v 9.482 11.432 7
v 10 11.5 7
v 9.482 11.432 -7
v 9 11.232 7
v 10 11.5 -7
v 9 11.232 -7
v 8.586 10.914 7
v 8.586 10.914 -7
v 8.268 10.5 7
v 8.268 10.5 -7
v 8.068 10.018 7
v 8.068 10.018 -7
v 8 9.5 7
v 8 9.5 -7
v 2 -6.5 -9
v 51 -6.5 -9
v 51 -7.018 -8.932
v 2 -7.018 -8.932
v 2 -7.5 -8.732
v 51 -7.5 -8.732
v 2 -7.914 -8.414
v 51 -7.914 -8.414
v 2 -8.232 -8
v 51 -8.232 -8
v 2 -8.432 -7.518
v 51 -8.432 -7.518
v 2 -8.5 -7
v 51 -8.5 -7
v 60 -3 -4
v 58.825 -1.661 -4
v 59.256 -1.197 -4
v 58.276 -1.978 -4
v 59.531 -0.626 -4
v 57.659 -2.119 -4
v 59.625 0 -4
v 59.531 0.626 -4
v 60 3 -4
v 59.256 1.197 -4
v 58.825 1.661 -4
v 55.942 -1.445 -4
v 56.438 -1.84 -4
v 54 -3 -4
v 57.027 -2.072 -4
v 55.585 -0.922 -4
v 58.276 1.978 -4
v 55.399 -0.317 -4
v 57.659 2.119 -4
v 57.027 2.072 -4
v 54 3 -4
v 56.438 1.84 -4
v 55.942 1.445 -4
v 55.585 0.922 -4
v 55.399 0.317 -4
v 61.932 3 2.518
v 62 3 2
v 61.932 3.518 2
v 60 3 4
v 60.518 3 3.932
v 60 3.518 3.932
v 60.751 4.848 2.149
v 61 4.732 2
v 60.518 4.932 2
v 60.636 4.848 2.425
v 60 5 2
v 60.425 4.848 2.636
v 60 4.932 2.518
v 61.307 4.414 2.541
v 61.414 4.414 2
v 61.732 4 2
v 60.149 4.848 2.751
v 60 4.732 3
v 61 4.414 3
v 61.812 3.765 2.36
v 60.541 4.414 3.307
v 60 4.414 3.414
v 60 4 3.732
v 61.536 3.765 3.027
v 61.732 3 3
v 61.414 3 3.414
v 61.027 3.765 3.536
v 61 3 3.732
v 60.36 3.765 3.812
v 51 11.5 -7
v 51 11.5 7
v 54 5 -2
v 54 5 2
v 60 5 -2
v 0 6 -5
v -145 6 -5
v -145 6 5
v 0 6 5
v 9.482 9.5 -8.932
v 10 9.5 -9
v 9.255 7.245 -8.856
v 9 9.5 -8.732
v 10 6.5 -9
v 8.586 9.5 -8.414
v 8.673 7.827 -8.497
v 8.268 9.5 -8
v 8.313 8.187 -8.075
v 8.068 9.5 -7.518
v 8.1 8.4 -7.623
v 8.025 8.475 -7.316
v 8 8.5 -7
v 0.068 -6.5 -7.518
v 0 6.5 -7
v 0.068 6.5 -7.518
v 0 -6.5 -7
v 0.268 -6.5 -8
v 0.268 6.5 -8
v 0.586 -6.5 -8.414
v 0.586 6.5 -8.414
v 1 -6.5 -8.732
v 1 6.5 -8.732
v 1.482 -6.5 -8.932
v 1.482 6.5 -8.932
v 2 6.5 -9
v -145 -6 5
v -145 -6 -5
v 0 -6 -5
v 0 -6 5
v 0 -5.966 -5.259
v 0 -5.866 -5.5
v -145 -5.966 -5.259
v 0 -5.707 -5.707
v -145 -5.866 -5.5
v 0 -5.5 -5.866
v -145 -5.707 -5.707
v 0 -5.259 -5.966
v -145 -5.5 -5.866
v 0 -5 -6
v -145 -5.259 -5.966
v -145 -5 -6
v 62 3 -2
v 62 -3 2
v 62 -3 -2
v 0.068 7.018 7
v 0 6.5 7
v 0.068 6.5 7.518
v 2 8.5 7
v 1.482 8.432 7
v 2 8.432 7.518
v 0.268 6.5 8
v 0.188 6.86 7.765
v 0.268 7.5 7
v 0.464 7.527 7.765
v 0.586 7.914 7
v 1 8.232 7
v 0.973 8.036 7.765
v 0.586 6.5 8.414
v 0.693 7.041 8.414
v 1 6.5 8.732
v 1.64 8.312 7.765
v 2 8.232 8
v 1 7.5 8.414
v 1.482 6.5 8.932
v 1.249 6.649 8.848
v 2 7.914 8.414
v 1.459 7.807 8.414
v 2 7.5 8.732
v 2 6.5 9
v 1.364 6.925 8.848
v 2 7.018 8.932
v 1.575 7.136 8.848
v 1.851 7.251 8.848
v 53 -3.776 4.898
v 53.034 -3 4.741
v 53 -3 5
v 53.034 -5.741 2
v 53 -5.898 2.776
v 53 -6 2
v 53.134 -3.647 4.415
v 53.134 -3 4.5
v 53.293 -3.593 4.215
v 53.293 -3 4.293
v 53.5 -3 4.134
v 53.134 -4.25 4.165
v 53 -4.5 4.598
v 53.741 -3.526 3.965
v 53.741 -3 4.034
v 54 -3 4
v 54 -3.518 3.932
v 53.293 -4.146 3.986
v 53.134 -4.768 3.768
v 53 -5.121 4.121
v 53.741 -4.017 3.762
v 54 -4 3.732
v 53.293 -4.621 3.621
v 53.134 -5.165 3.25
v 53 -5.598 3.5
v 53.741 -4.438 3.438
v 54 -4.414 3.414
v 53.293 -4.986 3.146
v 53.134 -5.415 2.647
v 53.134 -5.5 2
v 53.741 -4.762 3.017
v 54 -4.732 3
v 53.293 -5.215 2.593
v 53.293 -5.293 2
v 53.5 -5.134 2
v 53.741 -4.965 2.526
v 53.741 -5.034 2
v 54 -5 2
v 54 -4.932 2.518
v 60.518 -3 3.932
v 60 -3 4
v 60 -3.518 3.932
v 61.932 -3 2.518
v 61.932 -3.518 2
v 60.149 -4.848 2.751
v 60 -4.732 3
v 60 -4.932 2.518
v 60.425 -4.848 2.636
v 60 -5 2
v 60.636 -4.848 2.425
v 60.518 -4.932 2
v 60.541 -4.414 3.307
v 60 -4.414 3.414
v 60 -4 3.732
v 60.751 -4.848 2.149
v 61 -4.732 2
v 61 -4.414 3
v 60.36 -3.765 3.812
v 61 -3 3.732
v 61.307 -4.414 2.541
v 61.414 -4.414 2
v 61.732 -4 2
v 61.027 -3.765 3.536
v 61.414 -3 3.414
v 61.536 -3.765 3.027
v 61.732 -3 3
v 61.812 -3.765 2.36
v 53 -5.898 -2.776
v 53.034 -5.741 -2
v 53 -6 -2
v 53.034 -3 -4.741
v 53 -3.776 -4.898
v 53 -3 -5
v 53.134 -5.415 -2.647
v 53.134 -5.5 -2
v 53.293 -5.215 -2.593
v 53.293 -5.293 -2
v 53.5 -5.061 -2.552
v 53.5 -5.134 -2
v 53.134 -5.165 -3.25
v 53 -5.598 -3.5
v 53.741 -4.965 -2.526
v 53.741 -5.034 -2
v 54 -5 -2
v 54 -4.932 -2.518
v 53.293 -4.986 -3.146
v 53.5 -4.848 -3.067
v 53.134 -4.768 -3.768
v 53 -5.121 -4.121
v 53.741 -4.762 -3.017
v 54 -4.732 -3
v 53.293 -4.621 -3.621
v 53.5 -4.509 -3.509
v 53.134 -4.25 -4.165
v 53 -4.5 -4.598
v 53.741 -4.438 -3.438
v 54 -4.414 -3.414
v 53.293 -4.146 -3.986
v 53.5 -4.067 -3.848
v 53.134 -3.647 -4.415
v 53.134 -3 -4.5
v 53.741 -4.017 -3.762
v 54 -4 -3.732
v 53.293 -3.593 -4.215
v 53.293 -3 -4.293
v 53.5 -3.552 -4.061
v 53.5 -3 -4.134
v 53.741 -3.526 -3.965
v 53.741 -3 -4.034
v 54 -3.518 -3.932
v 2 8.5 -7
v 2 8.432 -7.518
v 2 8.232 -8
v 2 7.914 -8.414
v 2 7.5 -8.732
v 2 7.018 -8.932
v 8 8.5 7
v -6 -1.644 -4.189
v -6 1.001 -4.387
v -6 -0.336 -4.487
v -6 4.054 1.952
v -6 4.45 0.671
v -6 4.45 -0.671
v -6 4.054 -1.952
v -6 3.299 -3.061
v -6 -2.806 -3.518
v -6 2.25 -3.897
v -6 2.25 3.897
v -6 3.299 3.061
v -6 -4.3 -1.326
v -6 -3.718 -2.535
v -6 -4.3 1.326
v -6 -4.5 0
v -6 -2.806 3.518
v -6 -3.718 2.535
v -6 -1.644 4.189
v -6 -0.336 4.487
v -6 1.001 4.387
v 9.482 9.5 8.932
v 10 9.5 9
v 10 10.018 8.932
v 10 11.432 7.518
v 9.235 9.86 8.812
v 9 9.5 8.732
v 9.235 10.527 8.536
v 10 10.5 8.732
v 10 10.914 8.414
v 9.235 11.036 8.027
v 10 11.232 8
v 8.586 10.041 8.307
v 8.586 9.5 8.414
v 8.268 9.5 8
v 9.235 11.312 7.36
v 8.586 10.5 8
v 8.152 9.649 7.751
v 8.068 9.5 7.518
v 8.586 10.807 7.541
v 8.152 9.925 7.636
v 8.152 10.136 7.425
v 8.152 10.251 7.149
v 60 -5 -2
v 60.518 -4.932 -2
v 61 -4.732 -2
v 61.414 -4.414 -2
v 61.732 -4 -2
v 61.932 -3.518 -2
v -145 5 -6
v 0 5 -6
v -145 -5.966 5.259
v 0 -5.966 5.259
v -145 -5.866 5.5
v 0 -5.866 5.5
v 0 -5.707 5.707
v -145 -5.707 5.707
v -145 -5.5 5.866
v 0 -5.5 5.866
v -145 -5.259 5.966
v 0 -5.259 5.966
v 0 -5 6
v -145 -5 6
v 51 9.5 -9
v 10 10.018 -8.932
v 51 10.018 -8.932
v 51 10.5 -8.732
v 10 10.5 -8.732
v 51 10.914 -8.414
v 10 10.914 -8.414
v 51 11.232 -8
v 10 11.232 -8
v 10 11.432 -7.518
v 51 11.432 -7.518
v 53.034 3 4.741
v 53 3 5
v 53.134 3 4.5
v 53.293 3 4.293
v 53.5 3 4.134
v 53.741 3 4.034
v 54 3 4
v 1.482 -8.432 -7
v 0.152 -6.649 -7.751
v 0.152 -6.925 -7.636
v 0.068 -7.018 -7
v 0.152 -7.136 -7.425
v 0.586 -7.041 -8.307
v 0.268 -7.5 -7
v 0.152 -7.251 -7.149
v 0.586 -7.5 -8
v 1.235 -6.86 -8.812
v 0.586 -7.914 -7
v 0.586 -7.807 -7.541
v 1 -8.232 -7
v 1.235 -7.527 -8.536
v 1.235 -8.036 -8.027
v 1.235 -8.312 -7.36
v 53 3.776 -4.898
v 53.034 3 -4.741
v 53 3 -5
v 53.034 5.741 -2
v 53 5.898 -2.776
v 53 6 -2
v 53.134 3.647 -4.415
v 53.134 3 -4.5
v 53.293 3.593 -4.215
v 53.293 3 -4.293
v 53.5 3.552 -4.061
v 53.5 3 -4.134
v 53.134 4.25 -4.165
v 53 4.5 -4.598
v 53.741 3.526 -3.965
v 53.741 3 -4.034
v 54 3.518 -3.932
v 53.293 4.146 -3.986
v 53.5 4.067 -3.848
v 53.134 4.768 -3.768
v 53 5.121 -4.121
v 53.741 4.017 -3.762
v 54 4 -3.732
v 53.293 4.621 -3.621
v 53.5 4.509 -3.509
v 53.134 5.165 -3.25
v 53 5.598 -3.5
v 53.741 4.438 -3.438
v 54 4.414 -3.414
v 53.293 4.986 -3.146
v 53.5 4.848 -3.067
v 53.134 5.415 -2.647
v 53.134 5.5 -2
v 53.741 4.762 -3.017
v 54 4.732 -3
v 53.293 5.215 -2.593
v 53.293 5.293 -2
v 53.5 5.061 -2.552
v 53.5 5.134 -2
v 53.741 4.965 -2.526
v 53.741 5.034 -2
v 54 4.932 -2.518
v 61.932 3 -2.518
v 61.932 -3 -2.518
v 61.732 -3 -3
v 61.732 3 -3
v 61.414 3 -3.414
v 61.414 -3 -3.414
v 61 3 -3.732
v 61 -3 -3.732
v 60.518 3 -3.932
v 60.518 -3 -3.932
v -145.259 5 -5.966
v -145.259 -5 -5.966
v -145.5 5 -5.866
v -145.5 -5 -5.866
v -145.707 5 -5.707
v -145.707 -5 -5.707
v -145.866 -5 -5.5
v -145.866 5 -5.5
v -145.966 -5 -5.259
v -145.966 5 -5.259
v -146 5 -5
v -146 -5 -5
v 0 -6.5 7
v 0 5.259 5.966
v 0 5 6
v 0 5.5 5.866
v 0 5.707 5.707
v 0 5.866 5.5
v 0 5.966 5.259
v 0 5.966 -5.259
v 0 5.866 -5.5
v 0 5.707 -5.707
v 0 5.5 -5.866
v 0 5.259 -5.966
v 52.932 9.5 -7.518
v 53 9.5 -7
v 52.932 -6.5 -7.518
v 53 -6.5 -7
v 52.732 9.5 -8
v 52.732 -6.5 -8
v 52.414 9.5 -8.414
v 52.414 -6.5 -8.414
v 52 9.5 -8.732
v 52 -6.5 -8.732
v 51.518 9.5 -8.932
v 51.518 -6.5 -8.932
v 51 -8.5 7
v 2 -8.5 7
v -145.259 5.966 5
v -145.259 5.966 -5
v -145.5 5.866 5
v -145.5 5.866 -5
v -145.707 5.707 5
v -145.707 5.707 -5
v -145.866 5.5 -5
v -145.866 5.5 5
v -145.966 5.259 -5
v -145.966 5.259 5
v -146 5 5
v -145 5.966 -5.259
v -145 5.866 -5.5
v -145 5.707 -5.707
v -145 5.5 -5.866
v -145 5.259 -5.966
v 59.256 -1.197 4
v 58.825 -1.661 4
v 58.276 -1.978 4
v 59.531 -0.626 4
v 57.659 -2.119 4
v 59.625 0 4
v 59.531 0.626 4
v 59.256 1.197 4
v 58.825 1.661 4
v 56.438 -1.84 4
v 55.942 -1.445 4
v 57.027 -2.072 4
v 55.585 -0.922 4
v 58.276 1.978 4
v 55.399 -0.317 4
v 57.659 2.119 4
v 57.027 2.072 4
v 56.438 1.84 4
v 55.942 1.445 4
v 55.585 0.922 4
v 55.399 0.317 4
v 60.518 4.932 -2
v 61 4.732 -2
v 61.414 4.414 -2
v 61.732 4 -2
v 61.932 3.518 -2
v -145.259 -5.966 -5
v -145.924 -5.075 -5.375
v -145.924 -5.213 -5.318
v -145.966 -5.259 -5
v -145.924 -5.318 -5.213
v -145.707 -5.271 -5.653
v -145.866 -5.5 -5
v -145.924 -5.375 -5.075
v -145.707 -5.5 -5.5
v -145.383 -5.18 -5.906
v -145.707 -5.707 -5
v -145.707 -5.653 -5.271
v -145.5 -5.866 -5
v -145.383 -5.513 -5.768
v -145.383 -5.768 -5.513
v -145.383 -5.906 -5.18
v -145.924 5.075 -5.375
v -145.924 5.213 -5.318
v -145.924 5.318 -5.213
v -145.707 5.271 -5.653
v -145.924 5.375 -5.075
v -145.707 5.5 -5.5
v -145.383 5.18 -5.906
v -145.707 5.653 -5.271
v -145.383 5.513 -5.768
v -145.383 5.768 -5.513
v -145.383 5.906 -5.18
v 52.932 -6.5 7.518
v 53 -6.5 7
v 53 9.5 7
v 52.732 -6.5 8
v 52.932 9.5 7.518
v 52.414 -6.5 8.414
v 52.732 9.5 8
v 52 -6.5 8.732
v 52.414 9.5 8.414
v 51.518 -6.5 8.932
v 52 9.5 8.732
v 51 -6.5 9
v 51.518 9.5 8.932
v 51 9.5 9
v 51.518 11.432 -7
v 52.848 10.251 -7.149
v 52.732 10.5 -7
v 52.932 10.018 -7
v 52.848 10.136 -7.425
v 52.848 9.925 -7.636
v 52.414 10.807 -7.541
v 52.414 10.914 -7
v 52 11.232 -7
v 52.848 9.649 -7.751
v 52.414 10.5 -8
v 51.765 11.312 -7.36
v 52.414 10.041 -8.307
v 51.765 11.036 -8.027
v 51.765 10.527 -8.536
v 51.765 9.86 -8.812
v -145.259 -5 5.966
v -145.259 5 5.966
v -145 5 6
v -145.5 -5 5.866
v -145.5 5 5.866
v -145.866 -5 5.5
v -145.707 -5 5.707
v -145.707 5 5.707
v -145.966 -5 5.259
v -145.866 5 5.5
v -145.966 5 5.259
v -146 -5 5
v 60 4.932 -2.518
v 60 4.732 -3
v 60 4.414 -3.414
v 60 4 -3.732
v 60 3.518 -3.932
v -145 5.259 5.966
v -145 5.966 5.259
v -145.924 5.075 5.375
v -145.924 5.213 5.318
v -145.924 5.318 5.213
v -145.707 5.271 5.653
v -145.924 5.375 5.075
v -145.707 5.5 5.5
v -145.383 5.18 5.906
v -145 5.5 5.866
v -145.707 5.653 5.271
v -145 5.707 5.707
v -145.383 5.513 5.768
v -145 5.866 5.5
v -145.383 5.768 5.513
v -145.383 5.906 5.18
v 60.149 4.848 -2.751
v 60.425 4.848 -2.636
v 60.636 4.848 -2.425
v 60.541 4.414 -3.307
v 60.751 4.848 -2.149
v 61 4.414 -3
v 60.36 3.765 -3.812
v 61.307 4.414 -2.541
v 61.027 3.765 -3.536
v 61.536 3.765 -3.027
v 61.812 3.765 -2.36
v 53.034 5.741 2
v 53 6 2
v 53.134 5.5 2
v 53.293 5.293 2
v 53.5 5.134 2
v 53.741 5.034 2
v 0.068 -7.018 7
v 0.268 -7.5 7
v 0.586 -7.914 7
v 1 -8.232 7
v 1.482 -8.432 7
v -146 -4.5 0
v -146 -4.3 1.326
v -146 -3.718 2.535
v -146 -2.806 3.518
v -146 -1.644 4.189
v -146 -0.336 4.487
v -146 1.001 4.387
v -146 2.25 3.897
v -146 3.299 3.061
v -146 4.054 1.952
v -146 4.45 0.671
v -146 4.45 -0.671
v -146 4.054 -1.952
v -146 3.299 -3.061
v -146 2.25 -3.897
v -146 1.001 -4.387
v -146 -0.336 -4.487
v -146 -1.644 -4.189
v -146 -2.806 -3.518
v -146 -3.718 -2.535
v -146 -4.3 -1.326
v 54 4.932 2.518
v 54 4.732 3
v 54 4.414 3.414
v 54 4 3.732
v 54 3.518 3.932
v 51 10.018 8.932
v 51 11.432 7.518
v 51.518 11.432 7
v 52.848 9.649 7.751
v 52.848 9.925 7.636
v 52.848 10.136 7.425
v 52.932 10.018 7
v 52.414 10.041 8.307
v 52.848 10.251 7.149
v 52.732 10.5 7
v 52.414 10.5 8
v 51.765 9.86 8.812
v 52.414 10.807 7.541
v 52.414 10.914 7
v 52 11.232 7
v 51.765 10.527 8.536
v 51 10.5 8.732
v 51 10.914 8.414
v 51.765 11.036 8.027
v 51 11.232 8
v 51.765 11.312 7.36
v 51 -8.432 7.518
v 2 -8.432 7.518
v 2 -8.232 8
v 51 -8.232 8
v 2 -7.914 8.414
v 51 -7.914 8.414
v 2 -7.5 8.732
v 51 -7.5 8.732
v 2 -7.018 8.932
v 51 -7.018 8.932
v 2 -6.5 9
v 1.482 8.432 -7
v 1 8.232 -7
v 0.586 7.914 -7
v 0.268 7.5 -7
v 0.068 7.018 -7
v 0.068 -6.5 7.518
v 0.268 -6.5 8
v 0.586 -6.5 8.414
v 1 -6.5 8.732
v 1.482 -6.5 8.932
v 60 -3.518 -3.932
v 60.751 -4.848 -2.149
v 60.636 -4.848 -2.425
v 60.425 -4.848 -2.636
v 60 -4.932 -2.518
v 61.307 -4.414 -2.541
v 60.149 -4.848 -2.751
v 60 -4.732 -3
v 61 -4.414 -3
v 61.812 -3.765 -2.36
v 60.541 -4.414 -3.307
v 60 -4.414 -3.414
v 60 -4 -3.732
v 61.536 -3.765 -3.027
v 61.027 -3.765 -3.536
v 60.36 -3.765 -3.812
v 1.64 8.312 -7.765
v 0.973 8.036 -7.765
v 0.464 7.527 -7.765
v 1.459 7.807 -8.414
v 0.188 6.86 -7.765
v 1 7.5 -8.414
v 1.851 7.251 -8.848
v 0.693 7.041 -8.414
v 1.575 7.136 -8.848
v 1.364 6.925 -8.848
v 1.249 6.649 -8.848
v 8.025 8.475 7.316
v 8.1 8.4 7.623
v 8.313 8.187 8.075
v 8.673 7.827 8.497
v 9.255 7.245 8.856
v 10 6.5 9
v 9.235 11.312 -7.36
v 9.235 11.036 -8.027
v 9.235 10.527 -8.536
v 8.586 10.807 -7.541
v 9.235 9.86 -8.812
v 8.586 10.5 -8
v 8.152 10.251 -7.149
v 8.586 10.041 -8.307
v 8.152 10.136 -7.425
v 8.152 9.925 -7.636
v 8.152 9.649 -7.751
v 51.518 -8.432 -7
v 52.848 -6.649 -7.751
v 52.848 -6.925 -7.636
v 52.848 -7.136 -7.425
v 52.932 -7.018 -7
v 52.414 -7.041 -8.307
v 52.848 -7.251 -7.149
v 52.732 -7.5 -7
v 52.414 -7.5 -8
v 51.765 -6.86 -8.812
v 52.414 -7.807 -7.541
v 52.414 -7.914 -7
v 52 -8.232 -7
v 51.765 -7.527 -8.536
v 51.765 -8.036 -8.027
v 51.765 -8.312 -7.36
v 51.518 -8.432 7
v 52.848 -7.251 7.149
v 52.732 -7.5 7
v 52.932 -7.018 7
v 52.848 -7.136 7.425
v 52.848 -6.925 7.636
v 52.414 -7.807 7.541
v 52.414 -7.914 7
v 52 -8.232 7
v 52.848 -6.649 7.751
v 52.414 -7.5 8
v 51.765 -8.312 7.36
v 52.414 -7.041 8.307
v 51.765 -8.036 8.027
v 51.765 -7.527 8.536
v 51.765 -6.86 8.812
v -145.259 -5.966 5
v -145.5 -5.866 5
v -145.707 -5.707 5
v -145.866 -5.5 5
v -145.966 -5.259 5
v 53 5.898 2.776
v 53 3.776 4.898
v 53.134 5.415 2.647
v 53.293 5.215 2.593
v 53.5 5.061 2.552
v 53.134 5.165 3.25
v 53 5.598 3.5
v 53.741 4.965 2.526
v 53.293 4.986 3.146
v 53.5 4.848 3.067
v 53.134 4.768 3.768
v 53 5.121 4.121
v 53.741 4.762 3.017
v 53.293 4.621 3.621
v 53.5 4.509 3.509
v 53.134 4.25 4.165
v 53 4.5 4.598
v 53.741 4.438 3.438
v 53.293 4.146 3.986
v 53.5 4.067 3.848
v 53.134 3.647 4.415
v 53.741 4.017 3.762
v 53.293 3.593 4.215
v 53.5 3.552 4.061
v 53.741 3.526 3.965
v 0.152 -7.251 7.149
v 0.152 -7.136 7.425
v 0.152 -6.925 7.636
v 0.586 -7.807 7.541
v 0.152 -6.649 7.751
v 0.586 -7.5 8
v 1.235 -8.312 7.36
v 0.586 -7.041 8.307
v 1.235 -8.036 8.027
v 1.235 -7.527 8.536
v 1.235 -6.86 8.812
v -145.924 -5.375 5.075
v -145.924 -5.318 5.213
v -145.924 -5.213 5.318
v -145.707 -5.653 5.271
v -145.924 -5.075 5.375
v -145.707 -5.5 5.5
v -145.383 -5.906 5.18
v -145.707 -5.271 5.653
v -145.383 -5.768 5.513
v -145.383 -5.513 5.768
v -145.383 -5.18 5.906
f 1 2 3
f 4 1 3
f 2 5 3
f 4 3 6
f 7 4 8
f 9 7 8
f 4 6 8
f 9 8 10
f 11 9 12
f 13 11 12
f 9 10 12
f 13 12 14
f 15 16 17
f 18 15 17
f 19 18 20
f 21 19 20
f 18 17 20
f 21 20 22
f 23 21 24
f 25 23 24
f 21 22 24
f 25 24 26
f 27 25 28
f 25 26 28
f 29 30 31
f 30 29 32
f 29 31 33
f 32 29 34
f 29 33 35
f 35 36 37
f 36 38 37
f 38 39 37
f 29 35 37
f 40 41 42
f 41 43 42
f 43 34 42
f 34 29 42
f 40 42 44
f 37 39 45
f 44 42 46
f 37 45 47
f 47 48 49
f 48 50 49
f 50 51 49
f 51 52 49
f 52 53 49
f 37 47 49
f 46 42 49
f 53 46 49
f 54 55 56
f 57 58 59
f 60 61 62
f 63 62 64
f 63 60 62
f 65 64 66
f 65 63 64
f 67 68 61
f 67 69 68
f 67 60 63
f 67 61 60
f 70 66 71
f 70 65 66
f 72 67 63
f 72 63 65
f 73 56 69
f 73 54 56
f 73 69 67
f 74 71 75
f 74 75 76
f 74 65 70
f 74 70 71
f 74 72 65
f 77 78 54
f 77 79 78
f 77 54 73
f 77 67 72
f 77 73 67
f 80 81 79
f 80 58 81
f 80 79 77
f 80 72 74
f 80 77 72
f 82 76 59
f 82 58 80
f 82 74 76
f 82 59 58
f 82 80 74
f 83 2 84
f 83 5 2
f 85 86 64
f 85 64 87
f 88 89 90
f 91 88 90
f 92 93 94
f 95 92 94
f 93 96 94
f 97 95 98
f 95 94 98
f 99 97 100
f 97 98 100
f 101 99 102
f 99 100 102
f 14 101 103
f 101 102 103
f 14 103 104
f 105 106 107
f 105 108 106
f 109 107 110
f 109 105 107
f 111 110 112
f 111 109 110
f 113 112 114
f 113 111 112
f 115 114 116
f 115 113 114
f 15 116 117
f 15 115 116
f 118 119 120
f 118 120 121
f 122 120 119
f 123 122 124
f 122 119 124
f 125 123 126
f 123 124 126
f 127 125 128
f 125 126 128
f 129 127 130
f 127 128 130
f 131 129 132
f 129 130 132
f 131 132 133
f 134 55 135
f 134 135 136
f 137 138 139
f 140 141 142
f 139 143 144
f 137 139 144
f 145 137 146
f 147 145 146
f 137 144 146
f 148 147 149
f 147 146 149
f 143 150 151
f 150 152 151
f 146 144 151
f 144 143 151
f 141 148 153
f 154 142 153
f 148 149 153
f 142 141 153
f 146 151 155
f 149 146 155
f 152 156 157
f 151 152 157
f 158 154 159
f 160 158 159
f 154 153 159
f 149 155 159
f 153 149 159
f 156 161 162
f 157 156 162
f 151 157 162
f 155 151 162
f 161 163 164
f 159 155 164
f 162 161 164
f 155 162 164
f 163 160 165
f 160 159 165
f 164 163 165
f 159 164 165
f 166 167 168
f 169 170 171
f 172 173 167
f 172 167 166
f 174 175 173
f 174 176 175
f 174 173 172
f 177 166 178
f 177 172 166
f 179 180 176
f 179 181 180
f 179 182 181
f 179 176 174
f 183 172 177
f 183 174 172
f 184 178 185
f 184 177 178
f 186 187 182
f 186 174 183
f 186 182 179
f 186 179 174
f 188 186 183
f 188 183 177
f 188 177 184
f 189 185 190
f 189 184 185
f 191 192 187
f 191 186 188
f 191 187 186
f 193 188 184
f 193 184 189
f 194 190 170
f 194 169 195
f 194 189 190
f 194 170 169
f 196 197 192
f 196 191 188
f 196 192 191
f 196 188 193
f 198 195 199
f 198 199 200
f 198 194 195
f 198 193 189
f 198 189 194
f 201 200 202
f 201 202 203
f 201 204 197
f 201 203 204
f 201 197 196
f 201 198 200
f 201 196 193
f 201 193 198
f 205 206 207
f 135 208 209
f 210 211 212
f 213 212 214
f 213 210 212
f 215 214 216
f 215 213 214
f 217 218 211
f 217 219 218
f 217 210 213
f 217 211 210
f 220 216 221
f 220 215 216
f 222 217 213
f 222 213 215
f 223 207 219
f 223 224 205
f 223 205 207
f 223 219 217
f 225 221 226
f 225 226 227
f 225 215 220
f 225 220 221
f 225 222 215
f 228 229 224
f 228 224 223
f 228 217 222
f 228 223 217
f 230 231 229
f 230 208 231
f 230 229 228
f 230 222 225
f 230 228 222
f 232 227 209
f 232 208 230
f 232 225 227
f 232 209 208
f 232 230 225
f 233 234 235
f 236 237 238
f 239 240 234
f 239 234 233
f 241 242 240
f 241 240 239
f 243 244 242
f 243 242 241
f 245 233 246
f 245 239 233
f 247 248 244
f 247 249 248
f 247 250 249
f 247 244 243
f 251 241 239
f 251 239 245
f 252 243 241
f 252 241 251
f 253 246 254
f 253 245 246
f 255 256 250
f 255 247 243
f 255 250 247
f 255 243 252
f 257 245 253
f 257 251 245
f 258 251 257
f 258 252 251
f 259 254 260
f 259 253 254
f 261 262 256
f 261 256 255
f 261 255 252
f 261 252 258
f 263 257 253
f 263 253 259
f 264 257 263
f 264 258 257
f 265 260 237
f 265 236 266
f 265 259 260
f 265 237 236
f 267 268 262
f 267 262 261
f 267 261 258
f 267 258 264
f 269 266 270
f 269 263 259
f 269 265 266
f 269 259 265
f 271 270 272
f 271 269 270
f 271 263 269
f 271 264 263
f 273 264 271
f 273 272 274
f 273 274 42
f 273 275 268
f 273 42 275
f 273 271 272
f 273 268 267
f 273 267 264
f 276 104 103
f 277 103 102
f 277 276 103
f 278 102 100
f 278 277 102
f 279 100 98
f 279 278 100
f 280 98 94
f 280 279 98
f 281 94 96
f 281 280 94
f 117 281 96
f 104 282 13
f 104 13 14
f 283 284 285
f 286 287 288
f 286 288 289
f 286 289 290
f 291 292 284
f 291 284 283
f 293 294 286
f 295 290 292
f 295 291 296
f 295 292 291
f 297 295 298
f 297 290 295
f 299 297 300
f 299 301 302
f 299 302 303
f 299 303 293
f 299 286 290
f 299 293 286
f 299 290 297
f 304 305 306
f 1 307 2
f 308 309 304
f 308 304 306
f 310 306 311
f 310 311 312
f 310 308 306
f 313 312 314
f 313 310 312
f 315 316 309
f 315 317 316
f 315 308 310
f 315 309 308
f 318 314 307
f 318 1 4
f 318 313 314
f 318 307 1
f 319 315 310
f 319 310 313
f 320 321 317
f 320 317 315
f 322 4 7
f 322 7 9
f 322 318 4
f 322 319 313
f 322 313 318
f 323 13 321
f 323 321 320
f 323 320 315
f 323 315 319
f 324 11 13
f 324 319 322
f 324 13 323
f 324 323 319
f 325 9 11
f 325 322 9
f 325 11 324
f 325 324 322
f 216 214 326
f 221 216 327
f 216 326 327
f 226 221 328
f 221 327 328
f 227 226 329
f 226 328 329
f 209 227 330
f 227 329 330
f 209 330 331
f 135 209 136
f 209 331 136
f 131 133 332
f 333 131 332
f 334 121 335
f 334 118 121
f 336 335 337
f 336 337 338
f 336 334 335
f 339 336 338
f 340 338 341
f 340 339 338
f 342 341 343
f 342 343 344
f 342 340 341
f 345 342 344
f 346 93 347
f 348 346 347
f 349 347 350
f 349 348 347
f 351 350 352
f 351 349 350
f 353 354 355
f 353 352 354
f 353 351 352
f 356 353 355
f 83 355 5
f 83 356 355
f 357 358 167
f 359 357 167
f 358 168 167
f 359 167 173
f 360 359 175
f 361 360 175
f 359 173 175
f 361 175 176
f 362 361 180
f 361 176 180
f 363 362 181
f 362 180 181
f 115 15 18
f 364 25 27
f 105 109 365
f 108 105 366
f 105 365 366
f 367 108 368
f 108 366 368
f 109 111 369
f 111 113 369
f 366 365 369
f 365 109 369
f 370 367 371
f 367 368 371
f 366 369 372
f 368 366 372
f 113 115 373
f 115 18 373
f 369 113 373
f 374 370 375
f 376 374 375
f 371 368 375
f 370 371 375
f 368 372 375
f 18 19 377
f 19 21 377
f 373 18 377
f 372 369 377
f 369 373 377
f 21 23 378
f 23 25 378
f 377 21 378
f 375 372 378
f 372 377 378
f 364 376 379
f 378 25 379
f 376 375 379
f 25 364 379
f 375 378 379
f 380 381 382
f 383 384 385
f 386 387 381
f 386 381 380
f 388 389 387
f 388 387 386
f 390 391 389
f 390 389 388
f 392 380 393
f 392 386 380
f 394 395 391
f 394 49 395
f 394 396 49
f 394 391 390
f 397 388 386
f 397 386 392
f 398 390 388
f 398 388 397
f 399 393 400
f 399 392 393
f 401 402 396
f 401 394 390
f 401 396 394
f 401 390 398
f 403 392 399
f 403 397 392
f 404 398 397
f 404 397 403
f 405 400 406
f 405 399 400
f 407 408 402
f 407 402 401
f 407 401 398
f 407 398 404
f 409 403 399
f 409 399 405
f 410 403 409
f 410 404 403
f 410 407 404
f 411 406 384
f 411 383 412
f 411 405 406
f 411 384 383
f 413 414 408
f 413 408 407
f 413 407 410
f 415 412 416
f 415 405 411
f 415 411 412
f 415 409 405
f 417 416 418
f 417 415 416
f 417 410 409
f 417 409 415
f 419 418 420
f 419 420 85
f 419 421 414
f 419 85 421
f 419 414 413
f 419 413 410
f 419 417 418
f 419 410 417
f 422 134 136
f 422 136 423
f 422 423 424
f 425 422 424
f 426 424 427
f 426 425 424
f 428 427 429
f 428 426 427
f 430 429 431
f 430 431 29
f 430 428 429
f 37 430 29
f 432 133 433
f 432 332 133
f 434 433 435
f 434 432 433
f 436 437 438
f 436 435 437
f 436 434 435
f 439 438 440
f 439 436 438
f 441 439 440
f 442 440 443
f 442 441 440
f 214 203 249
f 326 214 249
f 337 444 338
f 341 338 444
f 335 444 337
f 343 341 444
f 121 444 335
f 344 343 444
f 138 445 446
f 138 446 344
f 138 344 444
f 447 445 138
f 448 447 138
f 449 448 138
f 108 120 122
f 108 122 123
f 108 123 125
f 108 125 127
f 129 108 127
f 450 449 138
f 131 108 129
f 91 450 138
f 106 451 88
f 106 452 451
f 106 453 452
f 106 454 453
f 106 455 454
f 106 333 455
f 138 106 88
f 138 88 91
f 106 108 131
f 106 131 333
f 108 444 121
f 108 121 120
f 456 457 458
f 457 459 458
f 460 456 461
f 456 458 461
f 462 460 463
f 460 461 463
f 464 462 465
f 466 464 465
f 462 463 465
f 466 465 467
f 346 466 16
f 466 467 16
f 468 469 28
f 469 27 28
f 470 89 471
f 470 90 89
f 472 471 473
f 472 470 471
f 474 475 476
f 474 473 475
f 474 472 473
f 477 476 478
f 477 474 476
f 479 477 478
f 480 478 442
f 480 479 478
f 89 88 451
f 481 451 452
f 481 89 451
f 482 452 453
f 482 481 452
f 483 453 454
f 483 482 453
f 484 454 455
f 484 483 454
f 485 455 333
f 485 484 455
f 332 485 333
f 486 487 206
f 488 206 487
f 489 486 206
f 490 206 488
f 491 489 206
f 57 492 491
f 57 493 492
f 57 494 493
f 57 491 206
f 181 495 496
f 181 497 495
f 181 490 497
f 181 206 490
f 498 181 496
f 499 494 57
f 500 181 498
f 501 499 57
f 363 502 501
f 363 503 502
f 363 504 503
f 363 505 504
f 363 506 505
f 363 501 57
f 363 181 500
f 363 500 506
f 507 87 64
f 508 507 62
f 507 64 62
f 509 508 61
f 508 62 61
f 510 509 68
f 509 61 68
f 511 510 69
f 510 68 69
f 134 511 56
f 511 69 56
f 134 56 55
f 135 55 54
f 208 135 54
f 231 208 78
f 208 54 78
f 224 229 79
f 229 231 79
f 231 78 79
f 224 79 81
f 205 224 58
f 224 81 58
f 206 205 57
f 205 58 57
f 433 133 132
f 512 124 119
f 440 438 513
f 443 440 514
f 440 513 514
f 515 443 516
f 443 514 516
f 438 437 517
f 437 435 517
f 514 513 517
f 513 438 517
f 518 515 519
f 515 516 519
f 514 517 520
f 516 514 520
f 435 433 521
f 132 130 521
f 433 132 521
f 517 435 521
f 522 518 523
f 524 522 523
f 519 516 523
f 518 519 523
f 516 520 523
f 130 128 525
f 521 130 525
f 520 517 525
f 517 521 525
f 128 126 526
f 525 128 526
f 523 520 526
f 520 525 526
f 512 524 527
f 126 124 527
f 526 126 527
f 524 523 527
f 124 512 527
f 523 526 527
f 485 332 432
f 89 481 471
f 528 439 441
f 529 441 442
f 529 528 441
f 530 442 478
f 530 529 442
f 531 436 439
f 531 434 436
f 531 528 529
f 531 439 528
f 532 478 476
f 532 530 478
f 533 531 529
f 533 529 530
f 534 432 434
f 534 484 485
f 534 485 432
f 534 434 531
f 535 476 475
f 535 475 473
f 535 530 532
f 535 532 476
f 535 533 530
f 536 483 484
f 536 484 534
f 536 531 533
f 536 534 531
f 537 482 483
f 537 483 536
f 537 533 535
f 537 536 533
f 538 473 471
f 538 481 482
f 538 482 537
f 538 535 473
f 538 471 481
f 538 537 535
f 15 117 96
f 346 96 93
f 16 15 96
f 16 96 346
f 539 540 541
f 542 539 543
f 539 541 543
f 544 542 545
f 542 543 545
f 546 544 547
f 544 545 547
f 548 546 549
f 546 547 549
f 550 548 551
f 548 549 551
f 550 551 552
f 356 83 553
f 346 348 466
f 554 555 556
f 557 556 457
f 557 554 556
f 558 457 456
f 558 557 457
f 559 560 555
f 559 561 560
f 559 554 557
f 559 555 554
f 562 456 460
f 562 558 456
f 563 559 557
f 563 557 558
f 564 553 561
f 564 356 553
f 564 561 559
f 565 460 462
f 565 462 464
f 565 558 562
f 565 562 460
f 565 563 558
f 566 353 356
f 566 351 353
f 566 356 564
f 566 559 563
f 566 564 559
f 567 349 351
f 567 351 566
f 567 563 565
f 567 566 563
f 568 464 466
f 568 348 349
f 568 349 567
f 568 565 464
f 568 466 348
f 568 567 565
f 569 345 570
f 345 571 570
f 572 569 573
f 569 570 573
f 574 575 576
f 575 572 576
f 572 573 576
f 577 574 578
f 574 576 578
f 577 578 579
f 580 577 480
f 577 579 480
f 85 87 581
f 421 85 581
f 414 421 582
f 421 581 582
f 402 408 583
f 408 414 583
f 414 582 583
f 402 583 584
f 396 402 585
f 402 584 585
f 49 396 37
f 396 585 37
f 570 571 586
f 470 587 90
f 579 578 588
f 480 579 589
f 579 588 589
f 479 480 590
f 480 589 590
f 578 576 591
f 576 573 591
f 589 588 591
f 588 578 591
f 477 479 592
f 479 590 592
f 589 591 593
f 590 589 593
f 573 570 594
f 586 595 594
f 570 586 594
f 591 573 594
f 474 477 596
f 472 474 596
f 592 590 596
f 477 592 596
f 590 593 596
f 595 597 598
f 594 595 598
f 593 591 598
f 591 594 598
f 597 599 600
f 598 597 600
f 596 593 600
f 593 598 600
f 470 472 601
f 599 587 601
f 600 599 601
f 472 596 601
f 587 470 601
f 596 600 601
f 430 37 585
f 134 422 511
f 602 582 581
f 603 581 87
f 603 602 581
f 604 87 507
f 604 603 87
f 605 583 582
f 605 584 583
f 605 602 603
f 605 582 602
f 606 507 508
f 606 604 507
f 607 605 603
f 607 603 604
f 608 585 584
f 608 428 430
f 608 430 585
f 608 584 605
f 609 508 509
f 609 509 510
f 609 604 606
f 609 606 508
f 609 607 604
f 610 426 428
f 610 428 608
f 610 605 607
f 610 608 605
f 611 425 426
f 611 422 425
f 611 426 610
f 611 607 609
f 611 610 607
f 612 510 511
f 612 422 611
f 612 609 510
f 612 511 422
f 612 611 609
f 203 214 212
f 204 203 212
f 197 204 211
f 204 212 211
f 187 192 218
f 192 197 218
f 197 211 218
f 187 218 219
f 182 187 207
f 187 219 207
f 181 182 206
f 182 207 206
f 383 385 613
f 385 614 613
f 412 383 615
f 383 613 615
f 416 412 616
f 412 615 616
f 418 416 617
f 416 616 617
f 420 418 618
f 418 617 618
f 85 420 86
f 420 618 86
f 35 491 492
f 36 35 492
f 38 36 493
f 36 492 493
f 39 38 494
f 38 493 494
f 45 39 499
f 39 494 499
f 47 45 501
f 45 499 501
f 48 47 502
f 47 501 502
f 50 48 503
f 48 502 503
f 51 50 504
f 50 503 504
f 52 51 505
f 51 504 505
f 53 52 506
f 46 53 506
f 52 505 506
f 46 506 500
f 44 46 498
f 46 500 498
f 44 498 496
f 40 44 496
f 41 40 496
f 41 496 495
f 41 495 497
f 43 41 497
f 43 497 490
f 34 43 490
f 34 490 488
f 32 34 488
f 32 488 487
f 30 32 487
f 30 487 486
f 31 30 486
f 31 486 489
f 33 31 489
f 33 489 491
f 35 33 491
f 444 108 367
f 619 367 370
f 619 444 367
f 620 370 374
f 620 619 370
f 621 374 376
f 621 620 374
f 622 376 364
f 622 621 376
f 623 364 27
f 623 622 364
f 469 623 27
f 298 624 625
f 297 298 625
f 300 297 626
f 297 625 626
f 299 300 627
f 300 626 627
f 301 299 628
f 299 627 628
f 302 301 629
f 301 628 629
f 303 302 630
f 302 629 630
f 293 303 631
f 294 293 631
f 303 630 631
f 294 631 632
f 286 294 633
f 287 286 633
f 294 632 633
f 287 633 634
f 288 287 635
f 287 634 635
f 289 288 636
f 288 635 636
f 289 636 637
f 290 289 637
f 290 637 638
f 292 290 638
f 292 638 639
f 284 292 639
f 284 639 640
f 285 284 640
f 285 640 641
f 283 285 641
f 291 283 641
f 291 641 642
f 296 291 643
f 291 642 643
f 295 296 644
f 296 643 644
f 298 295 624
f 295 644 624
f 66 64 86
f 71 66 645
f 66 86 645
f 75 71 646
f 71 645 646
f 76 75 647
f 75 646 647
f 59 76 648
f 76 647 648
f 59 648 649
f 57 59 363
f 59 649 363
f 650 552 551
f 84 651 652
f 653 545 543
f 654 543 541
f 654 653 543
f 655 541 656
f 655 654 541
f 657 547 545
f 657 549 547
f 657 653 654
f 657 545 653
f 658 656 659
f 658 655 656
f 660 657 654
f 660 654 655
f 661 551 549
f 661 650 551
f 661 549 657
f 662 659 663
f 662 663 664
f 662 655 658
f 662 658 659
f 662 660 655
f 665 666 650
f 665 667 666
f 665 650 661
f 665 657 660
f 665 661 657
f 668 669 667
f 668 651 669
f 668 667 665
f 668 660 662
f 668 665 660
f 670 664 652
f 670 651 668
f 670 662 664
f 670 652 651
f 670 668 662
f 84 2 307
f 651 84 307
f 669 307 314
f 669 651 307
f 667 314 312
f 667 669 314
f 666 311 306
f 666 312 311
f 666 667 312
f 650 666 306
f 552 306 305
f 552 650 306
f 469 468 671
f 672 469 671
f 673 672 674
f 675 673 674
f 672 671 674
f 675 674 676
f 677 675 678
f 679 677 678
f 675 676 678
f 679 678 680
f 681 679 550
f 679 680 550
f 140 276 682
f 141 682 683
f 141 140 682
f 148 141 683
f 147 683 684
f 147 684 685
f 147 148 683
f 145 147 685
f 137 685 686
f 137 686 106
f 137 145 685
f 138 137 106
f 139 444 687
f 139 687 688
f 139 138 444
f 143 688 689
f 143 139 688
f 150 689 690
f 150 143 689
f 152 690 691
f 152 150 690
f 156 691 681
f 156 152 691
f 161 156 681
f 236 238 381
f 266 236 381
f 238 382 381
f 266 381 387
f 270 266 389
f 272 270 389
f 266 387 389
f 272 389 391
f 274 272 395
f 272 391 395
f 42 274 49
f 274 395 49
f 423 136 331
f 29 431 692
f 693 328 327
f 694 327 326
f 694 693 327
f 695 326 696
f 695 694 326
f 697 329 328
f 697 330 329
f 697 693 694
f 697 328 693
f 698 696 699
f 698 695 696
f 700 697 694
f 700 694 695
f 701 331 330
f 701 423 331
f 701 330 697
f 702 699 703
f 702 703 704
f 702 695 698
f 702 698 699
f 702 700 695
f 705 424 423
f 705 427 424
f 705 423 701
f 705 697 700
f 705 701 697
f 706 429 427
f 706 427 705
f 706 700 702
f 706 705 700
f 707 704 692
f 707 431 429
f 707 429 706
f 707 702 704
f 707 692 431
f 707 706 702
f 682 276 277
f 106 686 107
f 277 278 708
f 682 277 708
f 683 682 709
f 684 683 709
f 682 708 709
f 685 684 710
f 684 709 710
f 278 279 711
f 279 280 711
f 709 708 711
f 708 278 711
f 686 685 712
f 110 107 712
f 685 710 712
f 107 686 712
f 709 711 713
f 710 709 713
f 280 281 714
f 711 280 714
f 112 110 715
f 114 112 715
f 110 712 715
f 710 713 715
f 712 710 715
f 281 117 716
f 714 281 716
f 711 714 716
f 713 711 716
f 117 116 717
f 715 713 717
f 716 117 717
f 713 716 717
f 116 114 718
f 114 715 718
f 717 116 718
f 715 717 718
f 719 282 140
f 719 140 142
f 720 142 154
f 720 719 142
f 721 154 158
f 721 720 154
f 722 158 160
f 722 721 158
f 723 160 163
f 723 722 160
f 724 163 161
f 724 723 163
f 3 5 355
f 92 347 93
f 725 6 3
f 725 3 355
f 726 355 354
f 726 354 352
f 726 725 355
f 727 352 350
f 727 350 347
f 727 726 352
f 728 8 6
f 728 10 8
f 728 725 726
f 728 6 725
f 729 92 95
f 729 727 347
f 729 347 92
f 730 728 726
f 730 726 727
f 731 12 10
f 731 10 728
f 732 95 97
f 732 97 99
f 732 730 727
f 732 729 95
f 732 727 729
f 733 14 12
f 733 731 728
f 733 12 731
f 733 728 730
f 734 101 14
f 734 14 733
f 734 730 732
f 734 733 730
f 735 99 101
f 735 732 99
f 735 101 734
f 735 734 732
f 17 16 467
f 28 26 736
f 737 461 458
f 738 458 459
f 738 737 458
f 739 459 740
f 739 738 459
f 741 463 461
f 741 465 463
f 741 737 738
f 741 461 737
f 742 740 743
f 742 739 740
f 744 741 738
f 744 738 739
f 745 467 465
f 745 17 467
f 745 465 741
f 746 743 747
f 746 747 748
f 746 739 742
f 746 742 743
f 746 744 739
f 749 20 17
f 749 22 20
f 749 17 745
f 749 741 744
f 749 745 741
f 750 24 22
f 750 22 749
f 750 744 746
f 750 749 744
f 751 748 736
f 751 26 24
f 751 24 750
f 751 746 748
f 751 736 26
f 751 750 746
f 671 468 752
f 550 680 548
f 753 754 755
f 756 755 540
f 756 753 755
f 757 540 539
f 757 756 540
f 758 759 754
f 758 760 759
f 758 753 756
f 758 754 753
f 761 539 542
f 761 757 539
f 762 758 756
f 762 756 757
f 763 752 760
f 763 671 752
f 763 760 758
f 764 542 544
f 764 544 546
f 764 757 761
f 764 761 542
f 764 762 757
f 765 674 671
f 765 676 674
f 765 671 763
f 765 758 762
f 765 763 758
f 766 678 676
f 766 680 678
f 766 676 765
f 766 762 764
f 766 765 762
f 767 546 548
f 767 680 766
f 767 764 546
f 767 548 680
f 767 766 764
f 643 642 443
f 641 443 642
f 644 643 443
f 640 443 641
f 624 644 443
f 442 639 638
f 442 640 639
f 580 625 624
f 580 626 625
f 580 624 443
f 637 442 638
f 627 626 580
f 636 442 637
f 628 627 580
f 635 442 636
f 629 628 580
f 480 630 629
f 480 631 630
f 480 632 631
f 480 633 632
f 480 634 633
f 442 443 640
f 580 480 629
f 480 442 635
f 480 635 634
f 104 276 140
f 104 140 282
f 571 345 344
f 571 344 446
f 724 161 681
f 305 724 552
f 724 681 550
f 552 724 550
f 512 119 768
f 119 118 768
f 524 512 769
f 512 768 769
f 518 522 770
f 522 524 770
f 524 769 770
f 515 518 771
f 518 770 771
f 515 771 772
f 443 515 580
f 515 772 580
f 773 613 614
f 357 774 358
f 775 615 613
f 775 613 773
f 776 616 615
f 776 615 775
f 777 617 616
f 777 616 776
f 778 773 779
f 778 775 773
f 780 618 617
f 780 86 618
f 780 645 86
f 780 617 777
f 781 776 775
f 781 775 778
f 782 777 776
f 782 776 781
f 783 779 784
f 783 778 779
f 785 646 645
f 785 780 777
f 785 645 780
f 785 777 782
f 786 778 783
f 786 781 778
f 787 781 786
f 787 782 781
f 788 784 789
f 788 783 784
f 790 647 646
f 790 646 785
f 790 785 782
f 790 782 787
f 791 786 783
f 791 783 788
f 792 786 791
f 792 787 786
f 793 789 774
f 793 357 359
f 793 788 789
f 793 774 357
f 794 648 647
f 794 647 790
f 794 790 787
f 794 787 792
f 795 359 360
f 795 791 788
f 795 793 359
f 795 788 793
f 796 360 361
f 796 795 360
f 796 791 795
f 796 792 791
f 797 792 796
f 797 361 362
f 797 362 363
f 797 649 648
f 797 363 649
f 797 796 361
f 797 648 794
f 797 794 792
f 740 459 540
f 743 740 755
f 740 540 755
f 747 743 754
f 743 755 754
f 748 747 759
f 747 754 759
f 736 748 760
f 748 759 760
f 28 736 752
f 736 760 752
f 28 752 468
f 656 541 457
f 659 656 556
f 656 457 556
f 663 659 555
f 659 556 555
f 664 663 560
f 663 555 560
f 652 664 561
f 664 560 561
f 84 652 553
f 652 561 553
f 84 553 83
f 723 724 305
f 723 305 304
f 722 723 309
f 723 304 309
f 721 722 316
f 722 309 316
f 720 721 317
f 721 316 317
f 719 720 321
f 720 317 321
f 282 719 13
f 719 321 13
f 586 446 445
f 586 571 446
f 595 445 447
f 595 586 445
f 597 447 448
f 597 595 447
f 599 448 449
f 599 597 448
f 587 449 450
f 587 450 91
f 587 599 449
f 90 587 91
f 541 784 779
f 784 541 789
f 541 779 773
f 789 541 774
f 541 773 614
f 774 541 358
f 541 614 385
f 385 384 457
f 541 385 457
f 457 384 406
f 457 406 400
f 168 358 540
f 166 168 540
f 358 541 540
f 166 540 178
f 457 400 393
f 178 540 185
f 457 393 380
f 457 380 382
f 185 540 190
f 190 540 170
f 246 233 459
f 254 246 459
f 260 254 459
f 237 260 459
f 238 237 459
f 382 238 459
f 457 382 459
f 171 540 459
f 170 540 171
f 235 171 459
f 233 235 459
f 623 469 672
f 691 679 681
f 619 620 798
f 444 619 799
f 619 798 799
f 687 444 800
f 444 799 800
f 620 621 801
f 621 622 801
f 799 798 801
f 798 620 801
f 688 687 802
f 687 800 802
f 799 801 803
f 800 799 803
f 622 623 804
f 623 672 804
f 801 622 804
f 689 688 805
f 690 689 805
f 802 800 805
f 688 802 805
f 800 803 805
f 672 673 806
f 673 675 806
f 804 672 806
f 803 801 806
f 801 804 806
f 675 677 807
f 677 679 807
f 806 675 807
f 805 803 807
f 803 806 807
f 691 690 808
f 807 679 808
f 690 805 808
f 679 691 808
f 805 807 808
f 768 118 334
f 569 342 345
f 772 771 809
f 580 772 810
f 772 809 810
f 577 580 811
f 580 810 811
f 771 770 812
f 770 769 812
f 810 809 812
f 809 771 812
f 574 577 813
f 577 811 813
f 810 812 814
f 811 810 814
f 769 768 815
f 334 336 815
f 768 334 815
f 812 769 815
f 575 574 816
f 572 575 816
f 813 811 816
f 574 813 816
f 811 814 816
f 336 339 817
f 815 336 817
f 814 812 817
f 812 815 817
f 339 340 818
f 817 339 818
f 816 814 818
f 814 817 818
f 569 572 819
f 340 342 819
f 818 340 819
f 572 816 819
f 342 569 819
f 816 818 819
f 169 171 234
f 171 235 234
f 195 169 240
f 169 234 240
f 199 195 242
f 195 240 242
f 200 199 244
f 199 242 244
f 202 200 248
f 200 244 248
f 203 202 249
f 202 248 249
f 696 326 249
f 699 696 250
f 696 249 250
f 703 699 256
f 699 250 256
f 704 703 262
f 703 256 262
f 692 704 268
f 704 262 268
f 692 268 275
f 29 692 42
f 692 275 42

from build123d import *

# Parameters (mm, degrees)
BOSS_EXTRUDE1_DEPTH      = 9
BOSS_EXTRUDE1_DEPTH_BACK = 9
SKETCH1_W                = 53
SKETCH1_H                = 17
SKETCH2_W                = 45
SKETCH2_H                = 18
BOSS_EXTRUDE2_DEPTH      = 3
SKETCH3_W                = 8
SKETCH3_H                = 10
BOSS_EXTRUDE3_DEPTH      = 9
SKETCH4_W                = 12
SKETCH4_H                = 12
BOSS_EXTRUDE4_DEPTH      = 146
CUT_EXTRUDE1_REACH       = 149.028
SKETCH6_R                = 2.125
FILLET2_R                = 2
FILLET3_R                = 1
SKETCH7_R                = 4.5
CUT_EXTRUDE2_DEPTH       = 140
FILLET4_R                = 1


with BuildPart() as part:
    # Sketch1 → Boss-Extrude1 (new, two sides: drawn at the far end of the back side and taken through both)
    with BuildSketch(Plane.XY.offset(-BOSS_EXTRUDE1_DEPTH_BACK)):
        with Locations((26.5, 0)):
            Rectangle(SKETCH1_W, SKETCH1_H)
    extrude(amount=BOSS_EXTRUDE1_DEPTH + BOSS_EXTRUDE1_DEPTH_BACK)

    # Sketch2 → Boss-Extrude2 (add)
    with BuildSketch(Plane(origin=(0, 8.5, 0), x_dir=(1, 0, 0), z_dir=(0, 1, 0))):
        with Locations((30.5, 0)):
            Rectangle(SKETCH2_W, SKETCH2_H)
    extrude(amount=BOSS_EXTRUDE2_DEPTH)

    # Sketch3 → Boss-Extrude3 (add)
    with BuildSketch(Plane(origin=(53, 0, 0), x_dir=(0, 0, -1), z_dir=(1, 0, 0))):
        Rectangle(SKETCH3_W, SKETCH3_H)
    extrude(amount=BOSS_EXTRUDE3_DEPTH)

    # Sketch4 → Boss-Extrude4 (add)
    with BuildSketch(Plane.ZY):
        Rectangle(SKETCH4_W, SKETCH4_H)
    extrude(amount=BOSS_EXTRUDE4_DEPTH)

    # Sketch6 → Cut-Extrude1 (cut, up to next)
    with BuildSketch(Plane.XY.offset(4), mode=Mode.PRIVATE) as cut_extrude1_sk1:
        with Locations((57.5, 0)):
            Circle(SKETCH6_R)
    cut_extrude1_tool1 = extrude(cut_extrude1_sk1.sketch, amount=-CUT_EXTRUDE1_REACH, mode=Mode.PRIVATE) & part.part
    add(cut_extrude1_tool1.solids().sort_by_distance((57.5, 0, 4))[0], mode=Mode.SUBTRACT)

    # Fillet2
    fillet2_edges = [part.edges().sort_by_distance(p)[0] for p in [
        (4, 8.5, 9),
        (8, 10, 9),
        (53, 1.5, 9),
        (0, 0, 9),
        (30.5, 11.5, 9),
        (8, 11.5, 0),
        (30.5, 11.5, -9),
        (53, 11.5, 0),
        (26.5, -8.5, -9),
        (0, -8.5, 0),
        (26.5, -8.5, 9),
        (53, -8.5, 0),
        (57.5, -5, -4),
        (62, 0, -4),
        (62, -5, 0),
        (57.5, -5, 4),
        (62, 0, 4),
        (0, 8.5, 0),
        (0, 0, -9),
        (4, 8.5, -9),
        (57.5, 5, 4),
        (62, 5, 0),
        (57.5, 5, -4),
        (53, 1.5, -9),
        (8, 10, -9),
    ]]
    fillet(fillet2_edges, radius=FILLET2_R)

    # Fillet3
    fillet3_edges = [part.edges().sort_by_distance(p)[0] for p in [
        (53, -4.414213562, 3.414213562),
        (53, 0, 4),
        (53, 4.414213562, 3.414213562),
        (53, 5, 0),
        (53, 4.414213562, -3.414213562),
        (53, 0, -4),
        (53, -4.414213562, -3.414213562),
        (53, -5, 0),
    ]]
    fillet(fillet3_edges, radius=FILLET3_R)

    # Sketch7 → Cut-Extrude2 (cut)
    with BuildSketch(Plane.ZY.offset(146)):
        Circle(SKETCH7_R)
    extrude(amount=-CUT_EXTRUDE2_DEPTH, mode=Mode.SUBTRACT)

    # Fillet4
    fillet4_edges = [part.edges().sort_by_distance(p)[0] for p in [
        (-146, 0, -6),
        (-146, -6, 0),
        (-73, -6, 6),
        (-73, -6, -6),
        (-146, 6, 0),
        (-73, 6, -6),
        (-146, 0, 6),
        (-73, 6, 6),
    ]]
    fillet(fillet4_edges, radius=FILLET4_R)


solid = part.part
